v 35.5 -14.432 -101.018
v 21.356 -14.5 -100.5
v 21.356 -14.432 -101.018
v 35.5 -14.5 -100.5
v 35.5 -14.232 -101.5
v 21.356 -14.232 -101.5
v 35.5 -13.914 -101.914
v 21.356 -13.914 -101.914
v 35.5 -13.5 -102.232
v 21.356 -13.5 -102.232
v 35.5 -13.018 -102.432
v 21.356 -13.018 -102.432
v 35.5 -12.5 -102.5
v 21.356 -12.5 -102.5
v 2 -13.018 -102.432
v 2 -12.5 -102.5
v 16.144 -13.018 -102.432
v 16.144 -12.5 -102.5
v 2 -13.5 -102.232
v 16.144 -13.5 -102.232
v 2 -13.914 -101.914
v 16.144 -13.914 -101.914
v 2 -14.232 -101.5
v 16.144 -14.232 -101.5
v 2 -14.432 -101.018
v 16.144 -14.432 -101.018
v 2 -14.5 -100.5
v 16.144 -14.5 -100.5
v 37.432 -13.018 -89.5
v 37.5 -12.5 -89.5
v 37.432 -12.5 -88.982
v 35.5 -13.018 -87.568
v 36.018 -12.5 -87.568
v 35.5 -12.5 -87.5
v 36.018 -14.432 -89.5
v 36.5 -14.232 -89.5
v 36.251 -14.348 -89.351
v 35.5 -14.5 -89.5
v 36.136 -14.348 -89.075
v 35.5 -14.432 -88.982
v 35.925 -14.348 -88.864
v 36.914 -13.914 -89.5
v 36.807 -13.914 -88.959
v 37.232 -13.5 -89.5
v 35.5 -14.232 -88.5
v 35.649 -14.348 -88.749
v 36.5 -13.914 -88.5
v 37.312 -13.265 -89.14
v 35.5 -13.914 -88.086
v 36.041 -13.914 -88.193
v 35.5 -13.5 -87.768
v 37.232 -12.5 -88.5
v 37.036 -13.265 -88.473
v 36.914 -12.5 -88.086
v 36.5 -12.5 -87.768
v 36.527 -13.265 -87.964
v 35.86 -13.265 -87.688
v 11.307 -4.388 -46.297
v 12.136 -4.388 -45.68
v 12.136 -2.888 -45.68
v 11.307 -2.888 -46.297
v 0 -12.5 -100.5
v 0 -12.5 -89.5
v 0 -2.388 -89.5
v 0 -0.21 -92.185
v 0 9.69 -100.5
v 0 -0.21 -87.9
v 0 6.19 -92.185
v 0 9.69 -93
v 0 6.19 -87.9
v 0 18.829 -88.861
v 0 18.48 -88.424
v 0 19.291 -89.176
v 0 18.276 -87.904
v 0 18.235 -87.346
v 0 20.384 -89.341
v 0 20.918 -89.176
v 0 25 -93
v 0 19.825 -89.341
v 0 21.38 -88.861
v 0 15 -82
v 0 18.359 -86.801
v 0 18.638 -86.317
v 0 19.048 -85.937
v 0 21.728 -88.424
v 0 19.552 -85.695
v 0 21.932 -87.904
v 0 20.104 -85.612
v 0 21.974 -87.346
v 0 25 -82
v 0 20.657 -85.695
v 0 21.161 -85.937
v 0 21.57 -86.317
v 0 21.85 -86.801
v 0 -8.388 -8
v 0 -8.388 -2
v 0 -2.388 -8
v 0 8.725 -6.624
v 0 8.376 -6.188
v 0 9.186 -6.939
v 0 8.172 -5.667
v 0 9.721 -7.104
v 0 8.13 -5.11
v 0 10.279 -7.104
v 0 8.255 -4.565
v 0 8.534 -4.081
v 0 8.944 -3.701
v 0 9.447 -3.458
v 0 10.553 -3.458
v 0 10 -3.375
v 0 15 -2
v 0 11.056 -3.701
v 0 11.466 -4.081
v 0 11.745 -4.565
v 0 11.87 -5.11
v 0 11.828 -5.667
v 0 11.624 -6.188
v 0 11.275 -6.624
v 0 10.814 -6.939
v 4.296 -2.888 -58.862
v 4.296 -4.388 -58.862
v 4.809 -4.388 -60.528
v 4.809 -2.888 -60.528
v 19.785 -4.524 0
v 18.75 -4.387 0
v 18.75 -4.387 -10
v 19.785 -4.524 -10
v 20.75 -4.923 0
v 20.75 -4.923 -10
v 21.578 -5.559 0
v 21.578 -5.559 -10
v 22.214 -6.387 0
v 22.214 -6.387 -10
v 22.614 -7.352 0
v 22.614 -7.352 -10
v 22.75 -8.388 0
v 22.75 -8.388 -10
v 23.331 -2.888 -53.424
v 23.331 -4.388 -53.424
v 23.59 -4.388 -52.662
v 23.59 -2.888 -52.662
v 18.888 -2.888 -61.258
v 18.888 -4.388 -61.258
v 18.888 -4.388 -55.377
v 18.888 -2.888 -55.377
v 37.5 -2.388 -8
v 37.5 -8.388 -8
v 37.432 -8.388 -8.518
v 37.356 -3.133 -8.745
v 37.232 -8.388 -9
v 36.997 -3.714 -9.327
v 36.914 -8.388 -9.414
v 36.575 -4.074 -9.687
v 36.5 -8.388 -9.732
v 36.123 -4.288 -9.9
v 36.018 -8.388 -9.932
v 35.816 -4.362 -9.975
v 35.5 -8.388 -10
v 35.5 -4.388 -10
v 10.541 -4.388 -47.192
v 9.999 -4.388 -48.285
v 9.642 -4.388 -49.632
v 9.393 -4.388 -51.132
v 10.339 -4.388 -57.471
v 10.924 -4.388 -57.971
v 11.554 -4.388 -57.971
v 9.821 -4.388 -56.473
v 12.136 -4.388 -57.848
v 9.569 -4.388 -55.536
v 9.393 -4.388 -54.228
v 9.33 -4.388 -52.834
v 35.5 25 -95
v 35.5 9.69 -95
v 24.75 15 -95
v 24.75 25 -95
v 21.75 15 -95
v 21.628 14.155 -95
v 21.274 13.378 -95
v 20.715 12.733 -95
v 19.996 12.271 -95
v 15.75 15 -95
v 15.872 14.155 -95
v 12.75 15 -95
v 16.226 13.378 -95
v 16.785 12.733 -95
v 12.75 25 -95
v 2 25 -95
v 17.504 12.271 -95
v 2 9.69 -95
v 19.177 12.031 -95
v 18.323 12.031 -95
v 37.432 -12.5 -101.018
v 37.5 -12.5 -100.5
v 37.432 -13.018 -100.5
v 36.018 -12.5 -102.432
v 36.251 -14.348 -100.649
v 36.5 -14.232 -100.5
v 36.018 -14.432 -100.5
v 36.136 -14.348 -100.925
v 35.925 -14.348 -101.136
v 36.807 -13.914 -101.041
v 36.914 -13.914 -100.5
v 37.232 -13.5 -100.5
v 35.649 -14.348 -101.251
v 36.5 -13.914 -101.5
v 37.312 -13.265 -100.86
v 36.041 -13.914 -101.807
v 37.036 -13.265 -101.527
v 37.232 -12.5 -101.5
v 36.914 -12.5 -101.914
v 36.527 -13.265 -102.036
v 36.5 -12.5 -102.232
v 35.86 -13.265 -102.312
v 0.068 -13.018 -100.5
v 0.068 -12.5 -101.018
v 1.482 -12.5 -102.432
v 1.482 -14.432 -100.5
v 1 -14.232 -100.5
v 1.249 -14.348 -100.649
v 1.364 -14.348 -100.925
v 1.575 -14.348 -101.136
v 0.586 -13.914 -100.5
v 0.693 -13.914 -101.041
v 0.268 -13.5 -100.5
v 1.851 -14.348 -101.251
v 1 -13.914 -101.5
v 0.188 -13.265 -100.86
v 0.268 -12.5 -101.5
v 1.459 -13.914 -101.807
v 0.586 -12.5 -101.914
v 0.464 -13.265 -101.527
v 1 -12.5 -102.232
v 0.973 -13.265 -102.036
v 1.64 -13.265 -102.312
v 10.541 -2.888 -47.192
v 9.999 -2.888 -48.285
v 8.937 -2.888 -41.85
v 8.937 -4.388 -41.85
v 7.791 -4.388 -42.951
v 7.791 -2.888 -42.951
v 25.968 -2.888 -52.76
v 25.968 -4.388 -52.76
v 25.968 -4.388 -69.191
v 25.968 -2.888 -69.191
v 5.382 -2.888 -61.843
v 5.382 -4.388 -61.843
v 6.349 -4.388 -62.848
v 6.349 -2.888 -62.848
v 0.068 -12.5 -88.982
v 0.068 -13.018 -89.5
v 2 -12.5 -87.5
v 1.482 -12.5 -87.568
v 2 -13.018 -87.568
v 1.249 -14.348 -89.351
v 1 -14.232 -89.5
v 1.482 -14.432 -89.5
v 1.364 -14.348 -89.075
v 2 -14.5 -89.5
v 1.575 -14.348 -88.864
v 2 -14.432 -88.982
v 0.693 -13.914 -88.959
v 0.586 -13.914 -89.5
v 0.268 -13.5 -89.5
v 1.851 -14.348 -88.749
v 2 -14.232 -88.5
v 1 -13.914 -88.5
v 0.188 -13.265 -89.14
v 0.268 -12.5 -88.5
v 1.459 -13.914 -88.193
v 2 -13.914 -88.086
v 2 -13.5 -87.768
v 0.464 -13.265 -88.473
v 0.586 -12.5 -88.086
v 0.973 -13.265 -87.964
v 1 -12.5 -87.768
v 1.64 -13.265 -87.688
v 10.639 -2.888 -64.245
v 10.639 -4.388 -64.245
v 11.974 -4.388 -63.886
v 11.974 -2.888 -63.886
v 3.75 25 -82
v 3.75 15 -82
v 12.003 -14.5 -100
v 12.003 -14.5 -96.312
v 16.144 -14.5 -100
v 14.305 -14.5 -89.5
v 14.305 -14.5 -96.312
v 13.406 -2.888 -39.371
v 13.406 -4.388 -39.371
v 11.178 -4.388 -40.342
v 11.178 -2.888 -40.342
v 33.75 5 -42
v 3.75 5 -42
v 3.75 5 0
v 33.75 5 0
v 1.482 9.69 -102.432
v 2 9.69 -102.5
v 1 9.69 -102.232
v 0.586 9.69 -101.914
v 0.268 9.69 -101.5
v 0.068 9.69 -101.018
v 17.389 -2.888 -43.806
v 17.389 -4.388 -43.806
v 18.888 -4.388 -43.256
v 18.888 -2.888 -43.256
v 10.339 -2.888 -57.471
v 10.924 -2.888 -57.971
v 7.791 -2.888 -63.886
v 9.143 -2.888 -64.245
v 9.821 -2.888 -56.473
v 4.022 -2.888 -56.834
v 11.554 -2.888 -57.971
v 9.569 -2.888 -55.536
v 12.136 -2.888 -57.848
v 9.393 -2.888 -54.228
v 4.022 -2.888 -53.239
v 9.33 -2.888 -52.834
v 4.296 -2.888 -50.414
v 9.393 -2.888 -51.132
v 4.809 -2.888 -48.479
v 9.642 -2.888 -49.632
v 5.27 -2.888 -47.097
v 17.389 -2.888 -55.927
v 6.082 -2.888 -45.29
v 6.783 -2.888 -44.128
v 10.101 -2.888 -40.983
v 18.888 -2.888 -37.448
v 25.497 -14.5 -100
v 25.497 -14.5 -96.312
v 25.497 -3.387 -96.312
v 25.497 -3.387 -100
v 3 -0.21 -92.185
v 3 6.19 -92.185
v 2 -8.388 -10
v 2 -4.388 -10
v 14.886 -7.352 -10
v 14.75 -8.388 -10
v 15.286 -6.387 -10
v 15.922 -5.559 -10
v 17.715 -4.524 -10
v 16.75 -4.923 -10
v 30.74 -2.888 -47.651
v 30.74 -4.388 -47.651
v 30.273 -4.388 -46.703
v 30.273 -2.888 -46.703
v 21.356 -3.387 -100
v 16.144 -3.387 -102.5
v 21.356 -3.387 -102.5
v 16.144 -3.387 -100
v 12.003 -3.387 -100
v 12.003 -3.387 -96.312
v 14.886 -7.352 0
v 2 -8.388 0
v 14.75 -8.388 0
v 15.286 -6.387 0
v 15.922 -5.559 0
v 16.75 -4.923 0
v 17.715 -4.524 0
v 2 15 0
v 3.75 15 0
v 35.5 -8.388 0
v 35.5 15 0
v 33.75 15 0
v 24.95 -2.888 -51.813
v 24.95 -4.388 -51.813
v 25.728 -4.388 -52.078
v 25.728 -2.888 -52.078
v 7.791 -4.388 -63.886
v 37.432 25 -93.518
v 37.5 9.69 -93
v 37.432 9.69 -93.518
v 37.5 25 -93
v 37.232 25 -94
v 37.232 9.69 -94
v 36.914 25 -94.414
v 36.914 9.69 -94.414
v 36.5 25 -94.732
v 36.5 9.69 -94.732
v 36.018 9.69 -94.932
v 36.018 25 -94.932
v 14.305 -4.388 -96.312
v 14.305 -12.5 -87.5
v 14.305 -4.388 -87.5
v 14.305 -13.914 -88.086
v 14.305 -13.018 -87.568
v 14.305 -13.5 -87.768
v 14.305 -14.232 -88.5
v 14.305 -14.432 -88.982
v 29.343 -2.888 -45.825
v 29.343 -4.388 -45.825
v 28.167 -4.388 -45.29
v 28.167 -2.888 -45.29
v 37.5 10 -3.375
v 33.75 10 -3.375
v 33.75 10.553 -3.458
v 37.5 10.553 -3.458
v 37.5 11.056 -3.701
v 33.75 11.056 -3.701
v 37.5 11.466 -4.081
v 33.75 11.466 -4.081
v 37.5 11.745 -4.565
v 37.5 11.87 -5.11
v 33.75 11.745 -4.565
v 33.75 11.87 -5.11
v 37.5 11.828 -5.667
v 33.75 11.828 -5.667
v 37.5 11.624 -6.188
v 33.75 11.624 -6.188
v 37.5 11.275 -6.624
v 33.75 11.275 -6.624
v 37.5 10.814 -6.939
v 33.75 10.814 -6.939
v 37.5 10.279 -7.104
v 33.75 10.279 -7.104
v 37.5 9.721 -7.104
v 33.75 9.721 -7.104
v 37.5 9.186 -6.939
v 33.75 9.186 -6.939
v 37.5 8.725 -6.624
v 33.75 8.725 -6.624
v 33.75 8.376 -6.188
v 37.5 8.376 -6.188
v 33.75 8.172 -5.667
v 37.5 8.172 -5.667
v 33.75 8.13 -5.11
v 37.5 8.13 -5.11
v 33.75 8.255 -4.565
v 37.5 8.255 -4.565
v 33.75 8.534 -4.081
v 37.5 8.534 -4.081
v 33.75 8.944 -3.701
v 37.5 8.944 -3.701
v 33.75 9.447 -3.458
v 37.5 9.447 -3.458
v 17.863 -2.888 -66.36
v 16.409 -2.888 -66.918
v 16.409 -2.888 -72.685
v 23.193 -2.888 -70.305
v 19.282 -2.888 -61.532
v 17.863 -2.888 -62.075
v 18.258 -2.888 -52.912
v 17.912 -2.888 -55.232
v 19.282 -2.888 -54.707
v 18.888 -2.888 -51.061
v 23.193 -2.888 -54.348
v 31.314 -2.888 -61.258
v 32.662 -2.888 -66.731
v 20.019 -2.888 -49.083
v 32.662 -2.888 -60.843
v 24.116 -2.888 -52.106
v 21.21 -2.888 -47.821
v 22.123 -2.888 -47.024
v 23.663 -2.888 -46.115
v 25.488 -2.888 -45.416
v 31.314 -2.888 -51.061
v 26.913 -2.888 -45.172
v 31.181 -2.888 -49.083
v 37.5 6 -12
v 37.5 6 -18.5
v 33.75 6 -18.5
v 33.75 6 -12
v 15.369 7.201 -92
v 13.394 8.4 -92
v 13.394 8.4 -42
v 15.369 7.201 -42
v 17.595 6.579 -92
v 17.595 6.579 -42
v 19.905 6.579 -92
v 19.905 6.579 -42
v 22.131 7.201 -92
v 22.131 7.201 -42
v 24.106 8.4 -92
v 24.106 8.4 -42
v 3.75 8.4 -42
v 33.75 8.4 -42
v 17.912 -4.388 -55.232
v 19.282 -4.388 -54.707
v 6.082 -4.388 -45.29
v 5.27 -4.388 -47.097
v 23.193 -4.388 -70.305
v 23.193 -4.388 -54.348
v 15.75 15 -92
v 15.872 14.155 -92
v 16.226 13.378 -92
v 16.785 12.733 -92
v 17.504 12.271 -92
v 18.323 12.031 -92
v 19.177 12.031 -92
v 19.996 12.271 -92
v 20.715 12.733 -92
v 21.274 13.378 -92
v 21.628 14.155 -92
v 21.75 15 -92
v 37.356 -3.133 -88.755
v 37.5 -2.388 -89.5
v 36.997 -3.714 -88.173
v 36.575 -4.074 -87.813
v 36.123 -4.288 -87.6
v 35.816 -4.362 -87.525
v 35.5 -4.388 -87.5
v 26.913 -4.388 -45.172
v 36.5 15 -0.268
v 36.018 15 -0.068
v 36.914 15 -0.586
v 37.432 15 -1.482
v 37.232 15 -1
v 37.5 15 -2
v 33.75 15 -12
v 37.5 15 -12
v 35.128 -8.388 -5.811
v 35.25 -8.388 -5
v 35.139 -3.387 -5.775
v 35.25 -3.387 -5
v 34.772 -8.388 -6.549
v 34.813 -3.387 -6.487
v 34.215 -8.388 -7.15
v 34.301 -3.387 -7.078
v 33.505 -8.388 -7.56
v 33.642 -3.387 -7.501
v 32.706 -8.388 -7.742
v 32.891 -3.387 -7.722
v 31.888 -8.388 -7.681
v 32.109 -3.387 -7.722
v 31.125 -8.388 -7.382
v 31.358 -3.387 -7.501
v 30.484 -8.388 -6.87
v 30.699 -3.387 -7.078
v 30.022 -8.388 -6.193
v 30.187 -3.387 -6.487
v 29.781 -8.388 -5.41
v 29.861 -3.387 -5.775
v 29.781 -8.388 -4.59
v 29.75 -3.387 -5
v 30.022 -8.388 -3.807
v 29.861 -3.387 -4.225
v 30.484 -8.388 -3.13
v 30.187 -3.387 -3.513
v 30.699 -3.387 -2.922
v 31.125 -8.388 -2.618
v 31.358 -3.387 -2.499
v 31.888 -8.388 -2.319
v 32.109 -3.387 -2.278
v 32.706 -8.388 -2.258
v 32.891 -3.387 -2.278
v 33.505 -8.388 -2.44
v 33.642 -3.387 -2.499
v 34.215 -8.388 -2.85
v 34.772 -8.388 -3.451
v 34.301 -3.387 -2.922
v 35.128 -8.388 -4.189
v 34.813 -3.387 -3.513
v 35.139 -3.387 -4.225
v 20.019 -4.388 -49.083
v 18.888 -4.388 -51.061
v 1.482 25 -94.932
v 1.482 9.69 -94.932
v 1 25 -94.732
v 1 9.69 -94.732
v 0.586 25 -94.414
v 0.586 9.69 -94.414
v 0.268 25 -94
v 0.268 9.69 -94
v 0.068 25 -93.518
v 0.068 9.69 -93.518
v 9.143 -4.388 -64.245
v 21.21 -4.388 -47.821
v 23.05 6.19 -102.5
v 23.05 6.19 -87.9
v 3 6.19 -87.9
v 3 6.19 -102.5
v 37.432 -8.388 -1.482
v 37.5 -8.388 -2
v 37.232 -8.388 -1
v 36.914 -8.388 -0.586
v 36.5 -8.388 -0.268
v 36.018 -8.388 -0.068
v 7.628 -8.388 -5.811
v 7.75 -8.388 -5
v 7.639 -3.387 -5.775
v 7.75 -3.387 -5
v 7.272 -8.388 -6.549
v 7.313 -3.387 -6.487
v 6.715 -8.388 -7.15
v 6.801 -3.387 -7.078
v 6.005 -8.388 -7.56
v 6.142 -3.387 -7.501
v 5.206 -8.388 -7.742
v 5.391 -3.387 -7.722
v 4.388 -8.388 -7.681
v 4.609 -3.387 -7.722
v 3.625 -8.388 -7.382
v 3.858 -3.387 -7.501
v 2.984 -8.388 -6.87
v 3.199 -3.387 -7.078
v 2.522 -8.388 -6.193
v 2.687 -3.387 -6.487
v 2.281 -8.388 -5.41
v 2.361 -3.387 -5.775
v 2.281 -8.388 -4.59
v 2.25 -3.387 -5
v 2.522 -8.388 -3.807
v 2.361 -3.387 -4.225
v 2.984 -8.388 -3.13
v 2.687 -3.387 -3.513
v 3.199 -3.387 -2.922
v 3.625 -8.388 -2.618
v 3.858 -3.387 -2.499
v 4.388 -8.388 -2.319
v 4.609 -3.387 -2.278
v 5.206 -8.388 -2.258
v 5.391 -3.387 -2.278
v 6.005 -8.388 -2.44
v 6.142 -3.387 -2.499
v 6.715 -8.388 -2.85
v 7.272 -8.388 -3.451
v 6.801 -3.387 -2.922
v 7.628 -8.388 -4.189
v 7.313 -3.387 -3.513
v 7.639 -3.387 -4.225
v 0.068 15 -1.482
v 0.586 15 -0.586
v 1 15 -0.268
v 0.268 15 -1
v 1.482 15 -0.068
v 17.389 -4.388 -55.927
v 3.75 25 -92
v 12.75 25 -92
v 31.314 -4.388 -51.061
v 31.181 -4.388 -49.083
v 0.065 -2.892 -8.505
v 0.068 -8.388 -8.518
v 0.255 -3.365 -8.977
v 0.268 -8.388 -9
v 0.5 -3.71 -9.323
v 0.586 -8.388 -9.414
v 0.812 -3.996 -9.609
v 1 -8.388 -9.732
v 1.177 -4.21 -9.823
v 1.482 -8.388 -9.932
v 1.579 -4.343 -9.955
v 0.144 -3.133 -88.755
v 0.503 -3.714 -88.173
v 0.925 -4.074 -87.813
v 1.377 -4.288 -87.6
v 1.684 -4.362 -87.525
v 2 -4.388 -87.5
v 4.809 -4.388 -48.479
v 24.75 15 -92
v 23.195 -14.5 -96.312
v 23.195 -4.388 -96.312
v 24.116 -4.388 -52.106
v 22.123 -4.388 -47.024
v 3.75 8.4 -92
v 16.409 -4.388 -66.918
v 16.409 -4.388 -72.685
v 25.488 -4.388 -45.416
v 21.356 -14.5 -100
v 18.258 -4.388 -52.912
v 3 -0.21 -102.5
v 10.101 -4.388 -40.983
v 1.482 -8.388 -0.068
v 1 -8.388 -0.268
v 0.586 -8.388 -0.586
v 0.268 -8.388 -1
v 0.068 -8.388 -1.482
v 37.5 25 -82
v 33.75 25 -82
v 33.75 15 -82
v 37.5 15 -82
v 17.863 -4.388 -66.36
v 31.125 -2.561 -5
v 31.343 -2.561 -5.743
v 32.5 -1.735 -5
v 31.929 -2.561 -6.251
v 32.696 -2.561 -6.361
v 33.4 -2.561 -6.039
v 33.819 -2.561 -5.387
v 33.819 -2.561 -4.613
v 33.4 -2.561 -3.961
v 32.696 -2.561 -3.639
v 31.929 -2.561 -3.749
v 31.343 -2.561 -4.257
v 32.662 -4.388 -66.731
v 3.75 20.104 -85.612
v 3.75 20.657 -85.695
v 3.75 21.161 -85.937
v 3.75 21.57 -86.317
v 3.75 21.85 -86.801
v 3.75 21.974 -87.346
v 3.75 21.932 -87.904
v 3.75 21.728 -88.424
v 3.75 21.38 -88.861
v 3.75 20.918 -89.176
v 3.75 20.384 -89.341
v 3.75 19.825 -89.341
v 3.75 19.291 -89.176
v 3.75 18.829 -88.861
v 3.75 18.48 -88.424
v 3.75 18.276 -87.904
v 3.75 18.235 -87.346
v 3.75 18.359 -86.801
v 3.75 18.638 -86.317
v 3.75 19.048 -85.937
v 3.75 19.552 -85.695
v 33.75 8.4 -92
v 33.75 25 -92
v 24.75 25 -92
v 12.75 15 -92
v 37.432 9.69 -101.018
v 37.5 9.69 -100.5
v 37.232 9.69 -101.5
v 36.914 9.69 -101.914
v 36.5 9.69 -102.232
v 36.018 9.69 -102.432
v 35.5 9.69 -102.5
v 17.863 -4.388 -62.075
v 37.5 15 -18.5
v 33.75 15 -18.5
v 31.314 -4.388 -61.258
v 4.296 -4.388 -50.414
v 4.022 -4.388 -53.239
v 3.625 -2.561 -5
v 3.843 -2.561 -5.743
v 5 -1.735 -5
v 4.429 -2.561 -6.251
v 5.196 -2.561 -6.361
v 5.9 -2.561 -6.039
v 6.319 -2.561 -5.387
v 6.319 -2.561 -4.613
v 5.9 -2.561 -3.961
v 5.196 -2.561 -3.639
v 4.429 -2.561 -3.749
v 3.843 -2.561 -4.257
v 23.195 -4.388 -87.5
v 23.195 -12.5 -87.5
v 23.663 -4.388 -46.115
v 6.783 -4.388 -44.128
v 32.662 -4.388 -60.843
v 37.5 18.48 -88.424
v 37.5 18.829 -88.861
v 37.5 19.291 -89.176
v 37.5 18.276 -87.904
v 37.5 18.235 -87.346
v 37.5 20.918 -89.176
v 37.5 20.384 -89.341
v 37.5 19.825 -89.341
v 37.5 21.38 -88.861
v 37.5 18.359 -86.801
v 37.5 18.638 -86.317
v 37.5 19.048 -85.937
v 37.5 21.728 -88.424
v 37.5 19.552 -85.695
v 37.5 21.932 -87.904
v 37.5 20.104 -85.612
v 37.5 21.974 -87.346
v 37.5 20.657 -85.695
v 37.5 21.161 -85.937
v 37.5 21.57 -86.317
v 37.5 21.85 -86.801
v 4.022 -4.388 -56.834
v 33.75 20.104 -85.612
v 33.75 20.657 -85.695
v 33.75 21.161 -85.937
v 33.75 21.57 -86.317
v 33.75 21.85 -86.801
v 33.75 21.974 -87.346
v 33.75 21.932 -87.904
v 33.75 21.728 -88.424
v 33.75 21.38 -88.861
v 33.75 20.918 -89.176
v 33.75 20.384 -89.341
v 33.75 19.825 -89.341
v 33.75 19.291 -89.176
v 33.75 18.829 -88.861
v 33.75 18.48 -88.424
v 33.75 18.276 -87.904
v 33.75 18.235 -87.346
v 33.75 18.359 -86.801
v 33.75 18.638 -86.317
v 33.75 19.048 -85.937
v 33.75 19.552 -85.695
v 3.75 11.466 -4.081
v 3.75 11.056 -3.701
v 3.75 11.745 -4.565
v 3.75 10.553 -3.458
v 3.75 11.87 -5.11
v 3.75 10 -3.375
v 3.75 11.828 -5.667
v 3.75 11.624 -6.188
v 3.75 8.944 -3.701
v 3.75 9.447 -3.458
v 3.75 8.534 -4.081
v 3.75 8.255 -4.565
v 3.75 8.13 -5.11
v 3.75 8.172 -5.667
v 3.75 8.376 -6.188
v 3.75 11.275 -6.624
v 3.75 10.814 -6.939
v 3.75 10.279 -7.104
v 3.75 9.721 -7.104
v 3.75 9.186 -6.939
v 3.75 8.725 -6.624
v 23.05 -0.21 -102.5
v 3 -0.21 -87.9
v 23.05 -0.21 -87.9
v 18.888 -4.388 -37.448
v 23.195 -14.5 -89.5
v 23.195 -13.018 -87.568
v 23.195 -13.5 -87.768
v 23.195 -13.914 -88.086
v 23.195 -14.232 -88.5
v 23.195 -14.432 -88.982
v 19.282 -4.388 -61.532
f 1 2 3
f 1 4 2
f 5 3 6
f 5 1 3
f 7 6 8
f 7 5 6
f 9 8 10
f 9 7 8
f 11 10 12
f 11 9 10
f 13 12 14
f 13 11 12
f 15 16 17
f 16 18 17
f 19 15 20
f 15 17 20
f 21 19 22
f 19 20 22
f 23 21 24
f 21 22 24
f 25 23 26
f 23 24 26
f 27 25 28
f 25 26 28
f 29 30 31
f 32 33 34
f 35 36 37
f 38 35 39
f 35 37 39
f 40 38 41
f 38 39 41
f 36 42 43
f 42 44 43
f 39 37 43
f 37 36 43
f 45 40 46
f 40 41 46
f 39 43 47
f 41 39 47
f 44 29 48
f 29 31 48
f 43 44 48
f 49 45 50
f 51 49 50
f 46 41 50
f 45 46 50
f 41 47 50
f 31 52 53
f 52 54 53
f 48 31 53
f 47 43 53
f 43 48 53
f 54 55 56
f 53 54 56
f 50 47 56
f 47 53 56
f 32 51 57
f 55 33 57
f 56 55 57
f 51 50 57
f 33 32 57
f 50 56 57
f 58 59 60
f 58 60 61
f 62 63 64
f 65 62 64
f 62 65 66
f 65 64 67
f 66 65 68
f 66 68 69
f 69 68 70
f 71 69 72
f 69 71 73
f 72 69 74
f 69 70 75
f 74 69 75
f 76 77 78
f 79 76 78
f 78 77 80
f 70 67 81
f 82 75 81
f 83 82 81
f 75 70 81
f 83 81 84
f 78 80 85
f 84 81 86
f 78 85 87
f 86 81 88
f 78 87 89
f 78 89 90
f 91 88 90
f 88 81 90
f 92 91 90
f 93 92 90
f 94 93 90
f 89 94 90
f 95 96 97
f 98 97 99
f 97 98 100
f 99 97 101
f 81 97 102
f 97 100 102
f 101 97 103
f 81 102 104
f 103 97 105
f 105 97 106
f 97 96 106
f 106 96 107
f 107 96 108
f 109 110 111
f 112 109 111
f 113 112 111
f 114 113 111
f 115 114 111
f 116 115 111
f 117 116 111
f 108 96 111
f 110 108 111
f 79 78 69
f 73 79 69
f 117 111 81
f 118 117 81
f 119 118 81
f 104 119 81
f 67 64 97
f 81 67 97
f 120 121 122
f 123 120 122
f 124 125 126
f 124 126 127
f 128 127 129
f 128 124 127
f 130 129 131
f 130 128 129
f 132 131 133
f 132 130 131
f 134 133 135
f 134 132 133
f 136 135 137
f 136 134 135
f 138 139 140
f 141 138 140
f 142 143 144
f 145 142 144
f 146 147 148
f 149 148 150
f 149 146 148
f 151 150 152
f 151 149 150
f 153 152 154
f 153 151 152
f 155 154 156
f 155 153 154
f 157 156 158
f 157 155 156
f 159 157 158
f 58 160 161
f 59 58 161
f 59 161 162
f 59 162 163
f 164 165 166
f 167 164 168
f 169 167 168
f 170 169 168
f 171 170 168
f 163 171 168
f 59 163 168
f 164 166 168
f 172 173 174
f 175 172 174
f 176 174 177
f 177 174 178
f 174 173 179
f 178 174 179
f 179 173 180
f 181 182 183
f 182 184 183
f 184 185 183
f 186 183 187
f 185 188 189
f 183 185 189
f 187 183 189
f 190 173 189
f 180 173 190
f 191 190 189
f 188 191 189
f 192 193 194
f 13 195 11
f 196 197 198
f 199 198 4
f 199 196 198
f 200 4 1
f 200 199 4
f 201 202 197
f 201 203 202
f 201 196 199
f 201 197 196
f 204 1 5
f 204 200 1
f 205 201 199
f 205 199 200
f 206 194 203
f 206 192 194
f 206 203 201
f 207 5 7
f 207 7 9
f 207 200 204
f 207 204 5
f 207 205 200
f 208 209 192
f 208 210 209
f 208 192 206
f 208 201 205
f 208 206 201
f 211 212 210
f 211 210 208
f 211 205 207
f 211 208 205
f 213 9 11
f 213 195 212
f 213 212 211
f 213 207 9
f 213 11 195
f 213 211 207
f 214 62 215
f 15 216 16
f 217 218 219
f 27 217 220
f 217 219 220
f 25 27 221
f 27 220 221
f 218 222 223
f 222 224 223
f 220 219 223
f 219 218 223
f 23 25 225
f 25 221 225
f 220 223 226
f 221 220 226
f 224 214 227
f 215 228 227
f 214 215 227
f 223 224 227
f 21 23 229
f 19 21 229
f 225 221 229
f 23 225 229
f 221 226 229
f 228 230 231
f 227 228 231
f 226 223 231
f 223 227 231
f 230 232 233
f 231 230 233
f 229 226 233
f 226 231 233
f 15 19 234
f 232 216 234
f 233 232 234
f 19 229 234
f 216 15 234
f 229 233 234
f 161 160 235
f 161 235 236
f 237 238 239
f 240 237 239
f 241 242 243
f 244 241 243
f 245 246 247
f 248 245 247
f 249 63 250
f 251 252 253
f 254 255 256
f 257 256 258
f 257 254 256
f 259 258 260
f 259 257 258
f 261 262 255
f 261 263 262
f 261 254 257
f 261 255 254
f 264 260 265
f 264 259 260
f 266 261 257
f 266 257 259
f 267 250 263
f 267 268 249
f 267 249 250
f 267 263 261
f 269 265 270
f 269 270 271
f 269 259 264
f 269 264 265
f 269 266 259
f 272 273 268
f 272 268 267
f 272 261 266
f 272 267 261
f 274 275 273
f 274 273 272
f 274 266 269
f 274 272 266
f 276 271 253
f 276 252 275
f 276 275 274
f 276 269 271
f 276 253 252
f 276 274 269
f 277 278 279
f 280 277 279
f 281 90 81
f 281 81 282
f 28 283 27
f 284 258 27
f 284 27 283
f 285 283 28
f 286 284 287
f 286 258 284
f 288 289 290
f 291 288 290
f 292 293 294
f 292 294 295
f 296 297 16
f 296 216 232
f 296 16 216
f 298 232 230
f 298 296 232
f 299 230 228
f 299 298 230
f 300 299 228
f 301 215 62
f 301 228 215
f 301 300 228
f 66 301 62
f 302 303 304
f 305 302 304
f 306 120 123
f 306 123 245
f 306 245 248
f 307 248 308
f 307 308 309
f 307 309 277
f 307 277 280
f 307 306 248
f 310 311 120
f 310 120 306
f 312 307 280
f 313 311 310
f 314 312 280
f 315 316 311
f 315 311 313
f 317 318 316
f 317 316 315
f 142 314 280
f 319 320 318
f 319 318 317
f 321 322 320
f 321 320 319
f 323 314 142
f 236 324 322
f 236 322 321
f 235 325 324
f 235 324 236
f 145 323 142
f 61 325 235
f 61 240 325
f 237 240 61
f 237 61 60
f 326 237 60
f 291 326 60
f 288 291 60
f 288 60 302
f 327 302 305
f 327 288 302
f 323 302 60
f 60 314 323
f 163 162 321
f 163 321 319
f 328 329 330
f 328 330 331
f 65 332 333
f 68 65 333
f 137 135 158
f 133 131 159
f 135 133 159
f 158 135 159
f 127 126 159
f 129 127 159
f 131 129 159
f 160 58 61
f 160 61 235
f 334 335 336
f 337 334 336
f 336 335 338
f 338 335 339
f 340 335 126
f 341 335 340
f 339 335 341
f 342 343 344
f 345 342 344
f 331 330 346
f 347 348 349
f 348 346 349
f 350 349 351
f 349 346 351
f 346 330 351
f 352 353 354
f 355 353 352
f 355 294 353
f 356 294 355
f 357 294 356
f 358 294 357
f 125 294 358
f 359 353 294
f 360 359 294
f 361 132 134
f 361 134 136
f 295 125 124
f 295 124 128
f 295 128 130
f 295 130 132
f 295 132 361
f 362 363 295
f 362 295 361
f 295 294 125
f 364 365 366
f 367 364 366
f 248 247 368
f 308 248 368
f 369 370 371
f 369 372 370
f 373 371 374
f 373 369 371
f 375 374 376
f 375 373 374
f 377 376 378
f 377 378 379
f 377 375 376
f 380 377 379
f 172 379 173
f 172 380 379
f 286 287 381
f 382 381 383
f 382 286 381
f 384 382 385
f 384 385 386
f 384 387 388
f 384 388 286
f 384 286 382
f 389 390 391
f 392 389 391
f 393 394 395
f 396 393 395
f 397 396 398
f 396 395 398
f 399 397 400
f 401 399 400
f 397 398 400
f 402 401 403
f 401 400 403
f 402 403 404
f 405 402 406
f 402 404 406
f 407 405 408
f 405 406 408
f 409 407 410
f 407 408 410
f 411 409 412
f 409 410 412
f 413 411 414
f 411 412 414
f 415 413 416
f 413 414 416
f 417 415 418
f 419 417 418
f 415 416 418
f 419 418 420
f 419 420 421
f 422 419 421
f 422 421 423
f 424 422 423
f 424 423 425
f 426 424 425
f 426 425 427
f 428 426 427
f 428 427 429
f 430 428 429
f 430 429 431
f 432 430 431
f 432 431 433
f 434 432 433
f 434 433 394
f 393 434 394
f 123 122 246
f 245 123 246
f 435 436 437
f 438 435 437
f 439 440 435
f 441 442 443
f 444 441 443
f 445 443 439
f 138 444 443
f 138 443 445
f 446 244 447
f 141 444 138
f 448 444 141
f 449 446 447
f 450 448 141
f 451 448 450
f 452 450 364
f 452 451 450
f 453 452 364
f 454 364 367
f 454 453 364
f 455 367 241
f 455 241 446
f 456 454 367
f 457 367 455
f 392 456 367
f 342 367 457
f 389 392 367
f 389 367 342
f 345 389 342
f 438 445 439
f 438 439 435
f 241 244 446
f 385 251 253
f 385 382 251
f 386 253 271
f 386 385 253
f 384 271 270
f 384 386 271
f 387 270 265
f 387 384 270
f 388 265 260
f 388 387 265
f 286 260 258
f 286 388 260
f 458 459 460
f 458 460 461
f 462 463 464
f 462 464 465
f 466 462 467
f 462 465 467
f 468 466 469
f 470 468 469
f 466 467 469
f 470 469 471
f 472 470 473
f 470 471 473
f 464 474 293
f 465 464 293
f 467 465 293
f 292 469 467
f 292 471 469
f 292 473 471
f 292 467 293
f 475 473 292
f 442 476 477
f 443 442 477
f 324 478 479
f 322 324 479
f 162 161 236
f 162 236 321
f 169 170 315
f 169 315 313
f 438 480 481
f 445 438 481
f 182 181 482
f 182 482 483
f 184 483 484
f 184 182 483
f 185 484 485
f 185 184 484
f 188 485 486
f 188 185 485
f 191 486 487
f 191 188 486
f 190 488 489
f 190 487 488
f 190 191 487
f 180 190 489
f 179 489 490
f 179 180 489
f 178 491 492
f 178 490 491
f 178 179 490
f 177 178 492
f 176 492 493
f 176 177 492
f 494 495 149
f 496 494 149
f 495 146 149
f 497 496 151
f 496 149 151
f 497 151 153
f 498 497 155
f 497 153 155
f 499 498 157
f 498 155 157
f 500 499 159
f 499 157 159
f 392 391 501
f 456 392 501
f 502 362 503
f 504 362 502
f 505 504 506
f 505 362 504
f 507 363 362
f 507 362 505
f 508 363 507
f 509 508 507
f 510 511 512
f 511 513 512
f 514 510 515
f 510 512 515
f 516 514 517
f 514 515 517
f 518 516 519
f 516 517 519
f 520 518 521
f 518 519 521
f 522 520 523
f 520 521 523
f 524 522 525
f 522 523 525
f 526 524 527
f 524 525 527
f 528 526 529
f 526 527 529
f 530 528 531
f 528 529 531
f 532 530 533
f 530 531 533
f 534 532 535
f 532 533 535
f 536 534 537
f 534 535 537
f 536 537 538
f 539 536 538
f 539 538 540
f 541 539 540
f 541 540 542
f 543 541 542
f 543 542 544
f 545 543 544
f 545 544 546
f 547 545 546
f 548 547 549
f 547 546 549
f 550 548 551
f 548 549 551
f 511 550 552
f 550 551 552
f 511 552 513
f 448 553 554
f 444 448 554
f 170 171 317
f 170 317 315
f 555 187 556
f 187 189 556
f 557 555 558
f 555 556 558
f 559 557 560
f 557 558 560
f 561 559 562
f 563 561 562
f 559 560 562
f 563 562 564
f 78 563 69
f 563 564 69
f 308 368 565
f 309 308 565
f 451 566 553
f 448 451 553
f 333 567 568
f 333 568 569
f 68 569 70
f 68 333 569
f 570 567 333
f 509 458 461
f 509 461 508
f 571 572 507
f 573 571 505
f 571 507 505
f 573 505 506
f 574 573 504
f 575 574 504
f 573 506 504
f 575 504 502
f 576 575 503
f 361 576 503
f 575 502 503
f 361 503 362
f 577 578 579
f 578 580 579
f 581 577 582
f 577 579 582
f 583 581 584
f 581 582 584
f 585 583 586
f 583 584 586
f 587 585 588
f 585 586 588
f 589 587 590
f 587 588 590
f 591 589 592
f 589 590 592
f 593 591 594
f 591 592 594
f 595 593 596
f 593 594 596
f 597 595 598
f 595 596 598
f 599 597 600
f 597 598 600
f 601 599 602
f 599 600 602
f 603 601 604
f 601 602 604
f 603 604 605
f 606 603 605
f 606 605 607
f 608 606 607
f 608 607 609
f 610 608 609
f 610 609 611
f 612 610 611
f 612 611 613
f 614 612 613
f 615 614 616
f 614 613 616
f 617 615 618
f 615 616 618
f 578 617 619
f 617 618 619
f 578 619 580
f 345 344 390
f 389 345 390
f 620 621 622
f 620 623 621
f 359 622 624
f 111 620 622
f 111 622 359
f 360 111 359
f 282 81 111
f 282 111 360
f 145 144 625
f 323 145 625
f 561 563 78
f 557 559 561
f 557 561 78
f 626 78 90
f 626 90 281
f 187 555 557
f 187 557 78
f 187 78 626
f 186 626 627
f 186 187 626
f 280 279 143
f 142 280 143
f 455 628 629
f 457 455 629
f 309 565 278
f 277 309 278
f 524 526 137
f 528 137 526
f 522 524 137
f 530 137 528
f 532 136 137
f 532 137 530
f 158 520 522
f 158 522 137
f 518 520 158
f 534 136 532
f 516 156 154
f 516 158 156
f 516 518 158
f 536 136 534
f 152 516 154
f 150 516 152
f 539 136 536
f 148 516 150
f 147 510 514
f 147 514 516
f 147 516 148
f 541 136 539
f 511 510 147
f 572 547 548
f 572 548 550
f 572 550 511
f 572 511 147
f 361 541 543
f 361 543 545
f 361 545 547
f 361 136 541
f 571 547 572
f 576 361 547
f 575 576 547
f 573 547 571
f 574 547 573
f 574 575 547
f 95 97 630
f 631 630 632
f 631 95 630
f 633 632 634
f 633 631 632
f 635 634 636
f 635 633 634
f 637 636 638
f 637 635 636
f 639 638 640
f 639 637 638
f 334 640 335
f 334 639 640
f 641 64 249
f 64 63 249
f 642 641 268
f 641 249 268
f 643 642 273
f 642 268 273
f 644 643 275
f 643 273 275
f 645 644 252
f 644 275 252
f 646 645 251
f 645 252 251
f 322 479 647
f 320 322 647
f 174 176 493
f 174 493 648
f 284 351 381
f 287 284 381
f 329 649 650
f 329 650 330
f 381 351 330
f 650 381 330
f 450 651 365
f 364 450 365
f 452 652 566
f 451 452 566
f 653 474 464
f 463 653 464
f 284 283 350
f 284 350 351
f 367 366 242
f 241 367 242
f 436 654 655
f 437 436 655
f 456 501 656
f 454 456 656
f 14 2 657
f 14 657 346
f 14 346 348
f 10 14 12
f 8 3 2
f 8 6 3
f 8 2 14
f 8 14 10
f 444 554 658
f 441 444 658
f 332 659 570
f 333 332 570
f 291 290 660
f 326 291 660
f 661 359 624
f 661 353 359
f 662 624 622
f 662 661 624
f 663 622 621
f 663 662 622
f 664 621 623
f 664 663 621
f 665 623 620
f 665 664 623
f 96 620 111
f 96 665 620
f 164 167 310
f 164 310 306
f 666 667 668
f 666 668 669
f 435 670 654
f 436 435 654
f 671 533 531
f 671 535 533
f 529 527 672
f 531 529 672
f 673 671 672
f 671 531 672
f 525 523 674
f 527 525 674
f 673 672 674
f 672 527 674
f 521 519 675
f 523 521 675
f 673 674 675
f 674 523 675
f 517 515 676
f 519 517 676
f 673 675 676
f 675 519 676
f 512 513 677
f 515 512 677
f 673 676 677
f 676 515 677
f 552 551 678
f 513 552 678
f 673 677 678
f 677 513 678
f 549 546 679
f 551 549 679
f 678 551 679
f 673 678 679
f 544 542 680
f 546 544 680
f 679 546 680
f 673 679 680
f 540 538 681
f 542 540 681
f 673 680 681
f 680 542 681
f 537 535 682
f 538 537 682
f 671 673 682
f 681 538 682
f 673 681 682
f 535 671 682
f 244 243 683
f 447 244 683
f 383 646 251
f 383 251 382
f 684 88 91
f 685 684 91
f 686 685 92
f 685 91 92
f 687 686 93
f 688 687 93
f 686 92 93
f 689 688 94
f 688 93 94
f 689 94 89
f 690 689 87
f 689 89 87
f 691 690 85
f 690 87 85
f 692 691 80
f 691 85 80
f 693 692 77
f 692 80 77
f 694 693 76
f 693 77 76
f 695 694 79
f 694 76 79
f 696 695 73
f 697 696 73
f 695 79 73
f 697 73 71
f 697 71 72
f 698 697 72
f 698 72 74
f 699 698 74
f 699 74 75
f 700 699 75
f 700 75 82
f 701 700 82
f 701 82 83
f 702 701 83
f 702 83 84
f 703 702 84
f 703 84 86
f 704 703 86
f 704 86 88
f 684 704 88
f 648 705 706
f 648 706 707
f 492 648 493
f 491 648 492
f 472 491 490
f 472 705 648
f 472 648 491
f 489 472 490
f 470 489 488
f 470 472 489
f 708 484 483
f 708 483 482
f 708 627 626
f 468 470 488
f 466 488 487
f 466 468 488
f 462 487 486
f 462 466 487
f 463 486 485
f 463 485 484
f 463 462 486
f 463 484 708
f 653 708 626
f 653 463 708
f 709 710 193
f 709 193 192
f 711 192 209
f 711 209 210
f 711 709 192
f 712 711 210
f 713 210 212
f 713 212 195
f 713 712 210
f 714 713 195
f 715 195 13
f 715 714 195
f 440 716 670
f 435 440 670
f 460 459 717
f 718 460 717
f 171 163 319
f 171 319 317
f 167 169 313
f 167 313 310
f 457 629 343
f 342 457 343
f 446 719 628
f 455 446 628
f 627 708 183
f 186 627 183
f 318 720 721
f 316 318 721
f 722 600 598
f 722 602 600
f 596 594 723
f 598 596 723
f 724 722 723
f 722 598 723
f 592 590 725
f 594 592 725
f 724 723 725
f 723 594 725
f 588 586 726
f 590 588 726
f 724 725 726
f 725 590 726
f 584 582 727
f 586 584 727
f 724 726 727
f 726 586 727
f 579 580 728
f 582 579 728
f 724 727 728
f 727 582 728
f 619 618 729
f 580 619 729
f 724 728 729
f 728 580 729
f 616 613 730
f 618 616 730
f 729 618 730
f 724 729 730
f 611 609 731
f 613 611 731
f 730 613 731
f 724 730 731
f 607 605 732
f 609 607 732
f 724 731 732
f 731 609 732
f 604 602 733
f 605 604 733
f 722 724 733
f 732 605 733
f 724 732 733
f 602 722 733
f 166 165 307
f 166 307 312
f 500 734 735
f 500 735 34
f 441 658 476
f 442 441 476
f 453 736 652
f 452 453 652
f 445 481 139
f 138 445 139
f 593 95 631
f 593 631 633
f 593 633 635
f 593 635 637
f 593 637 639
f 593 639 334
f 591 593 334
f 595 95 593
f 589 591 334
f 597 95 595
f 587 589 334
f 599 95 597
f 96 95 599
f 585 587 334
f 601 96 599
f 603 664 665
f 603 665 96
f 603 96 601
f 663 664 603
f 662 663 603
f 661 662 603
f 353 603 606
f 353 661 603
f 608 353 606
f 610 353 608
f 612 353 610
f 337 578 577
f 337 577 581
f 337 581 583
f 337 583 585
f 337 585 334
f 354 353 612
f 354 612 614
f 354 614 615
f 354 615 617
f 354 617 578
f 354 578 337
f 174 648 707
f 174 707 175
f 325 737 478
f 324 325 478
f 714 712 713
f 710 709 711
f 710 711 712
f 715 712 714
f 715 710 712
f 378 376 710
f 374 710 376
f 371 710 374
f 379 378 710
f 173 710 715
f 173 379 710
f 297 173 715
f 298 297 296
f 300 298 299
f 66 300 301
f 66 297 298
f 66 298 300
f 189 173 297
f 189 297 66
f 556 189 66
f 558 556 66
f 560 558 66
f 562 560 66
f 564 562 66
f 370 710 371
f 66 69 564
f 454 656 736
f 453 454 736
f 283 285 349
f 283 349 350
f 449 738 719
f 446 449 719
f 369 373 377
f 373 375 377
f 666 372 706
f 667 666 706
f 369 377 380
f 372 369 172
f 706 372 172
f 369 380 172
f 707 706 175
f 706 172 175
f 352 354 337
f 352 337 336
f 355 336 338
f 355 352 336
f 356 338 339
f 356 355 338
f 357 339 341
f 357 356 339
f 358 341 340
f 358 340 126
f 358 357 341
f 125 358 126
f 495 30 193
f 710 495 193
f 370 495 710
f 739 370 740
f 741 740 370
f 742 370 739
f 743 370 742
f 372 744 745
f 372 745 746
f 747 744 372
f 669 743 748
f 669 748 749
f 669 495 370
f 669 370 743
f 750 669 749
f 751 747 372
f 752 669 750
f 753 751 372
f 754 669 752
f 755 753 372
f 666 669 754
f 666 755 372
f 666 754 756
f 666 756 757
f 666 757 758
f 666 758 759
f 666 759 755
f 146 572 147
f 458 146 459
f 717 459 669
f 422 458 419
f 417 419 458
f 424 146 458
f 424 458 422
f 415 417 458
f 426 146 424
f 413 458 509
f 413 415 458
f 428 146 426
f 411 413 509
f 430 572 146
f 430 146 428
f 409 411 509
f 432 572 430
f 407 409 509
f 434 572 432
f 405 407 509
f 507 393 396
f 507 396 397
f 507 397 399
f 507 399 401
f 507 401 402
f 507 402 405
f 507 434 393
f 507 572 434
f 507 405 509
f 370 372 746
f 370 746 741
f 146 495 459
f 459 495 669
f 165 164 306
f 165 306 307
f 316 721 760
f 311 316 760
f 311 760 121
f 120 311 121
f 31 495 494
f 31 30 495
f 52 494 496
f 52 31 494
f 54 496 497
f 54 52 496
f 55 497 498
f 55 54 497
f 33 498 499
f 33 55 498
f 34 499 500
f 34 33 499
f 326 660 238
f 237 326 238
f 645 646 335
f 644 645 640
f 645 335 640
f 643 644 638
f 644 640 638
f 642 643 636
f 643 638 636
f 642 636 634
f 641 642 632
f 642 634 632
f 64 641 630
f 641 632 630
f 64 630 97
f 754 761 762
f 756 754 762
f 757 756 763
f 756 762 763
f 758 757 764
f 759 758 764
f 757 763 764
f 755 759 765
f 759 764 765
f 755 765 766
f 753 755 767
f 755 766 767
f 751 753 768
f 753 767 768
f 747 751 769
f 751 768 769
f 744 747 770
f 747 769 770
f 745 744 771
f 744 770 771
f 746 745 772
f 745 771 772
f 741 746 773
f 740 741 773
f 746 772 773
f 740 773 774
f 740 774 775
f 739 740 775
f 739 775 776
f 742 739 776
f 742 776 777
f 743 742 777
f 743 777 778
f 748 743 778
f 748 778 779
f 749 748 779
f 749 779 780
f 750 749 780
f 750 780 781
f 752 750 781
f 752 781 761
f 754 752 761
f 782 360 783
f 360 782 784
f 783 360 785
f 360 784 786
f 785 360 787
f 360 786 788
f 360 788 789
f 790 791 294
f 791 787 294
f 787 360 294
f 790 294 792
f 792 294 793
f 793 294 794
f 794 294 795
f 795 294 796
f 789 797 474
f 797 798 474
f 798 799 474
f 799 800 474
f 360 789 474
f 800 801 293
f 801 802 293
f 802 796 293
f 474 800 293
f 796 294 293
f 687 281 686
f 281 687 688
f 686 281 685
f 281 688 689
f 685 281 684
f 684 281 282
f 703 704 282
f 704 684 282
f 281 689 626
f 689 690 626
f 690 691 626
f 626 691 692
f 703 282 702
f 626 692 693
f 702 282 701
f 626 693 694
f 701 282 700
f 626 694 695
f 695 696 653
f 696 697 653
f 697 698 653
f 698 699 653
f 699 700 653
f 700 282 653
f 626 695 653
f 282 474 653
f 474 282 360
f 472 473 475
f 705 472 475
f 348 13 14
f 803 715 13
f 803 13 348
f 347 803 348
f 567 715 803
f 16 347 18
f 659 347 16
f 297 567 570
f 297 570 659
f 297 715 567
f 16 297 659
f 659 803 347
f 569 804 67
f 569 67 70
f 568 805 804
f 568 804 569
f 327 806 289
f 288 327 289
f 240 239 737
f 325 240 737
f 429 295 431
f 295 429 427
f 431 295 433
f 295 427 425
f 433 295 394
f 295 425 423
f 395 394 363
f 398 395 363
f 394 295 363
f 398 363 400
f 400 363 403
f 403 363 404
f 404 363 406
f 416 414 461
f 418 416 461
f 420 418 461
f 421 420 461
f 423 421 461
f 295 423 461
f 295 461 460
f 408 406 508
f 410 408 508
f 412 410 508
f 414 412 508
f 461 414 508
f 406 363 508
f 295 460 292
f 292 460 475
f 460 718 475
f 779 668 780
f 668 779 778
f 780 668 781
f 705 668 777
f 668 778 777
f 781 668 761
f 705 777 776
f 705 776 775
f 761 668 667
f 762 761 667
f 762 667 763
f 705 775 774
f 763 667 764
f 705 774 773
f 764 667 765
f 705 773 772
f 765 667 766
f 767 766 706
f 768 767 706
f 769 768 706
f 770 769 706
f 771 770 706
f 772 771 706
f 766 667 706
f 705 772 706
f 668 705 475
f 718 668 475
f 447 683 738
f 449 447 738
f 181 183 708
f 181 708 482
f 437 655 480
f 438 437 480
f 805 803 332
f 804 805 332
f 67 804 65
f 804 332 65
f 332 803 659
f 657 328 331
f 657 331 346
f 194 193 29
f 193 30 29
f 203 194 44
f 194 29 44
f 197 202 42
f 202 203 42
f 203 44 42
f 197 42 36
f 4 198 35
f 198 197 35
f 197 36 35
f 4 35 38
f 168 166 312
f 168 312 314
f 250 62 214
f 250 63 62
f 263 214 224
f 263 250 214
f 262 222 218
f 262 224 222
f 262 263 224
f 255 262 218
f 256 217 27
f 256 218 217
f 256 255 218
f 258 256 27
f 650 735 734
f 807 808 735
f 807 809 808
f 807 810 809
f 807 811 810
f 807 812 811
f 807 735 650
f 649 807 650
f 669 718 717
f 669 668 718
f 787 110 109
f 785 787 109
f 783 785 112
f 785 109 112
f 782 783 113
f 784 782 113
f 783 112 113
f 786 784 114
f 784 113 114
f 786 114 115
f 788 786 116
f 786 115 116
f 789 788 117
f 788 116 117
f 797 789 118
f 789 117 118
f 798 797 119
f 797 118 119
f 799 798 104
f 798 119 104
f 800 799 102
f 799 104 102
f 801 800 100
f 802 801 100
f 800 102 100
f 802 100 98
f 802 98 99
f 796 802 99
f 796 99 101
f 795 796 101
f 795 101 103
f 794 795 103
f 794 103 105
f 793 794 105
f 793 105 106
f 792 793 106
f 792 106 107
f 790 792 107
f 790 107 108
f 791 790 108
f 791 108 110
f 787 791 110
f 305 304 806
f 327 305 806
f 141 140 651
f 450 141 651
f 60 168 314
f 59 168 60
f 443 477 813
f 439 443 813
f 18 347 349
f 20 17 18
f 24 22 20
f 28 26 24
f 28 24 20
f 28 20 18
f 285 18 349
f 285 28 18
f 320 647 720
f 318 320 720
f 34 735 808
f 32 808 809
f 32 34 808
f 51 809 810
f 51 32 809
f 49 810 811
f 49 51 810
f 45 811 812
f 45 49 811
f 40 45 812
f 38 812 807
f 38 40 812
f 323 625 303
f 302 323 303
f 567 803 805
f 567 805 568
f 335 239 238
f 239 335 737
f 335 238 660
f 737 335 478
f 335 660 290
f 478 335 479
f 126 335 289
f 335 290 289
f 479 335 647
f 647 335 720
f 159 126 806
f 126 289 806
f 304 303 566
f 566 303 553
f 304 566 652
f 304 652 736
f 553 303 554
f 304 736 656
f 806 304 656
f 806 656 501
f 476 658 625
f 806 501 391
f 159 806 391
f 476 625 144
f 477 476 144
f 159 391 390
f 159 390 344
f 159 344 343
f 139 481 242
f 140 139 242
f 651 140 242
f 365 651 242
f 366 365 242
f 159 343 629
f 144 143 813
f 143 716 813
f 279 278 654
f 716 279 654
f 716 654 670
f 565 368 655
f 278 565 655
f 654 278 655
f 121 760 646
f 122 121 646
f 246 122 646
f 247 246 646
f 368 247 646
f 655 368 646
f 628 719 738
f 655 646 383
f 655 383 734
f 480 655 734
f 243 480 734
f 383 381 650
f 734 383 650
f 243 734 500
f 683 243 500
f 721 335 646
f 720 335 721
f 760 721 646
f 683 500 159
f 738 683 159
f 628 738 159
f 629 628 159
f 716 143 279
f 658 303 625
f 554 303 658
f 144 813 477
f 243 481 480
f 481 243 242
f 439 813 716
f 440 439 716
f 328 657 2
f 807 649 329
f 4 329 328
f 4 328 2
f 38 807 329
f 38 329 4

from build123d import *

# Parameters (mm, degrees)
SKETCH2_W                 = 37.5
SKETCH2_H                 = 95
BOSS_EXTRUDE1_DEPTH       = 15
SKETCH3_W                 = 30
SKETCH3_H                 = 42
CUT_EXTRUDE1_DEPTH        = 10
SKETCH5_R                 = 8.5
SKETCH5_W                 = 30
SKETCH5_H                 = 6.6
CUT_EXTRUDE2_DEPTH        = 50
CUT_EXTRUDE3_DEPTH        = 10
SKETCH7_W                 = 6.5
SKETCH7_H                 = 9
CUT_EXTRUDE4_DEPTH        = 3.75
SKETCH8_W                 = 12.75
SKETCH8_H                 = 3
BOSS_EXTRUDE2_DEPTH       = 10
F_2_5MM_DOWEL_HOLE2_D     = 3.75
SKETCH14_W                = 37.5
SKETCH14_H                = 15
BOSS_EXTRUDE3_DEPTH       = 14.5
CUT_EXTRUDE5_DEPTH        = 11.1125
SKETCH16_W                = 8.89
SKETCH16_H                = 8.8125
BOSS_EXTRUDE4_DEPTH       = 1
SKETCH17_W                = 3.75
SKETCH17_H                = 10
BOSS_EXTRUDE5_DEPTH       = 10
F_2_5MM_DOWEL_HOLE3_D     = 3.75
SKETCH24_W                = 37.5
SKETCH24_H                = 4.3875
BOSS_EXTRUDE7_DEPTH       = 87.5
BOSS_EXTRUDE8_DEPTH       = 10
SKETCH26_W                = 37.5
SKETCH26_H                = 9.690281336
BOSS_EXTRUDE9_DEPTH       = 7.5
SKETCH27_W                = 20.05
SKETCH27_H                = 6.4
CUT_EXTRUDE6_DEPTH        = 14.6
FILLET2_R                 = 2
F_2_5MM_DOWEL_HOLE4_D     = 5.5
F_2_5MM_DOWEL_HOLE4_DEPTH = 5
F_2_5MM_DOWEL_HOLE4_TIP   = 1.652366702
SKETCH31_W                = 4.284862737
SKETCH31_H                = 6.4
CUT_EXTRUDE7_DEPTH        = 112.002252229
CUT_EXTRUDE8_DEPTH        = 1.5


with BuildPart() as part:
    # Sketch2 → Boss-Extrude1 (new body)
    with BuildSketch(Plane(origin=(0, 0, 0), x_dir=(1, 0, 0), z_dir=(0, 1, 0))):
        with Locations((18.75, 47.5)):
            Rectangle(SKETCH2_W, SKETCH2_H)
    extrude(amount=BOSS_EXTRUDE1_DEPTH)

    # Sketch3 → Cut-Extrude1 (cut)
    with BuildSketch(Plane(origin=(0, 15, 0), x_dir=(1, 0, 0), z_dir=(0, 1, 0))):
        with Locations((18.75, 21)):
            Rectangle(SKETCH3_W, SKETCH3_H)
    extrude(amount=-CUT_EXTRUDE1_DEPTH, mode=Mode.SUBTRACT)

    # Sketch5 → Cut-Extrude2 (cut)
    with BuildSketch(Plane.XY.offset(-42)):
        with Locations((18.75, 15)):
            Circle(SKETCH5_R)
        with Locations((18.75, 11.7)):
            Rectangle(SKETCH5_W, SKETCH5_H)
    extrude(amount=-CUT_EXTRUDE2_DEPTH, mode=Mode.SUBTRACT)

    # Sketch6 → Cut-Extrude3 (cut)
    with BuildSketch(Plane(origin=(0, 0, -95), x_dir=(-1, 0, 0), z_dir=(0, 0, -1))):
        with BuildLine():
            Line((-21.75, 15), (-15.75, 15))
            ThreePointArc((-15.75, 15), (-18.75, 12), (-21.75, 15))
        make_face()
    extrude(amount=-CUT_EXTRUDE3_DEPTH, mode=Mode.SUBTRACT)

    # Sketch7 → Cut-Extrude4 (cut)
    with BuildSketch(Plane.ZY.offset(-37.5)):
        with Locations((-15.25, 10.5)):
            Rectangle(SKETCH7_W, SKETCH7_H)
    extrude(amount=CUT_EXTRUDE4_DEPTH, mode=Mode.SUBTRACT)

    # Sketch8 → Boss-Extrude2 (add)
    with BuildSketch(Plane(origin=(0, 15, 0), x_dir=(1, 0, 0), z_dir=(0, 1, 0))):
        with Locations((6.375, 93.5)):
            Rectangle(SKETCH8_W, SKETCH8_H)
    boss_extrude2 = extrude(amount=BOSS_EXTRUDE2_DEPTH)

    # Mirror1: Boss-Extrude2 across plane
    add(boss_extrude2.mirror(Plane.ZY.offset(-18.75)))

    # Ø2.5mm Dowel Hole2 (through all)
    with Locations(Plane(origin=(37.5, 0, 0), x_dir=(0, 0, -1), z_dir=(1, 0, 0))):
        with Locations((5.25, 10)):
            Hole(F_2_5MM_DOWEL_HOLE2_D / 2)

    # Sketch14 → Boss-Extrude3 (add)
    with BuildSketch(Plane.XZ):
        with Locations((18.75, -95)):
            Rectangle(SKETCH14_W, SKETCH14_H)
    extrude(amount=BOSS_EXTRUDE3_DEPTH)

    # Sketch15 → Cut-Extrude5 (cut)
    with BuildSketch(Plane.XZ.offset(14.5)):
        Polygon((16.143541, -102.5), (16.143541, -100), (12.003125, -100), (12.003125, -96.3125), (14.305, -96.3125), (14.305, -87.5), (23.195, -87.5), (23.195, -96.3125), (25.496875, -96.3125), (25.496875, -100), (21.356459, -100), (21.356459, -102.5), align=None)
    extrude(amount=-CUT_EXTRUDE5_DEPTH, mode=Mode.SUBTRACT)

    # Sketch16 → Boss-Extrude4 (add)
    with BuildSketch(Plane.XZ.offset(3.3875)):
        with Locations((18.75, -91.90625)):
            Rectangle(SKETCH16_W, SKETCH16_H)
    extrude(amount=BOSS_EXTRUDE4_DEPTH)

    # Sketch17 → Boss-Extrude5 (add)
    with BuildSketch(Plane(origin=(0, 15, 0), x_dir=(1, 0, 0), z_dir=(0, 1, 0))):
        with Locations((1.875, 87)):
            Rectangle(SKETCH17_W, SKETCH17_H)
        with Locations((35.625, 87)):
            Rectangle(SKETCH17_W, SKETCH17_H)
    extrude(amount=BOSS_EXTRUDE5_DEPTH)

    # Ø2.5mm Dowel Hole3 (through all)
    with Locations(Plane(origin=(37.5, 0, 0), x_dir=(0, 0, -1), z_dir=(1, 0, 0))):
        with Locations((87.486504599, 20.104293775)):
            Hole(F_2_5MM_DOWEL_HOLE3_D / 2)

    # Sketch24 → Boss-Extrude7 (add)
    with BuildSketch(Plane.XY.offset(-87.5)):
        with Locations((18.75, -2.19375)):
            Rectangle(SKETCH24_W, SKETCH24_H)
    extrude(amount=BOSS_EXTRUDE7_DEPTH)

    # Sketch25 → Boss-Extrude8 (add)
    with BuildSketch(Plane.XY):
        with BuildLine():
            Line((37.5, -4.3875), (18.75, -4.3875))
            ThreePointArc((18.75, -4.3875), (21.578427125, -5.559072875), (22.75, -8.3875))
            Line((22.75, -8.3875), (37.5, -8.3875))
            Line((37.5, -8.3875), (37.5, -4.3875))
        make_face()
        with BuildLine():
            Line((18.75, -4.3875), (0, -4.3875))
            Line((0, -4.3875), (0, -8.3875))
            Line((0, -8.3875), (14.75, -8.3875))
            ThreePointArc((14.75, -8.3875), (15.921572875, -5.559072875), (18.75, -4.3875))
        make_face()
    extrude(amount=-BOSS_EXTRUDE8_DEPTH)

    # Sketch26 → Boss-Extrude9 (add)
    with BuildSketch(Plane(origin=(0, 0, -95), x_dir=(-1, 0, 0), z_dir=(0, 0, -1))):
        with Locations((-18.75, 4.845140668)):
            Rectangle(SKETCH26_W, SKETCH26_H)
    extrude(amount=BOSS_EXTRUDE9_DEPTH)

    # Sketch27 → Cut-Extrude6 (cut)
    with BuildSketch(Plane(origin=(0, 0, -102.5), x_dir=(-1, 0, 0), z_dir=(0, 0, -1))):
        with Locations((-13.025, 2.990281336)):
            Rectangle(SKETCH27_W, SKETCH27_H)
    extrude(amount=-CUT_EXTRUDE6_DEPTH, mode=Mode.SUBTRACT)

    # Fillet2
    fillet2_edges = [part.edges().sort_by_distance(p)[0] for p in [
        (0, -9.44375, -87.5),
        (0, -2.404859332, -102.5),
        (37.5, -2.404859332, -102.5),
        (37.5, -9.44375, -87.5),
        (0, -14.5, -95),
        (8.0717705, -14.5, -102.5),
        (37.5, -14.5, -95),
        (30.3475, -14.5, -87.5),
        (29.4282295, -14.5, -102.5),
        (7.1525, -14.5, -87.5),
        (37.5, -4.3875, -48.75),
        (37.5, -6.3875, -10),
        (0, -4.3875, -48.75),
        (0, -6.3875, -10),
        (0, 17.345140668, -95),
        (37.5, 17.345140668, -95),
        (37.5, 3.30625, 0),
        (0, 3.30625, 0),
    ]]
    fillet(fillet2_edges, radius=FILLET2_R)

    # Ø2.5mm Dowel Hole4
    with Locations(Plane(origin=(0, -8.3875, 0), x_dir=(-1, 0, 0), z_dir=(0, -1, 0))):
        with Locations((-32.5, 5), (-5, 5)):
            Hole(F_2_5MM_DOWEL_HOLE4_D / 2, depth=F_2_5MM_DOWEL_HOLE4_DEPTH)
            with Locations((0, 0, -(F_2_5MM_DOWEL_HOLE4_DEPTH + F_2_5MM_DOWEL_HOLE4_TIP / 2))):  # 118° drill point
                Cone(0, F_2_5MM_DOWEL_HOLE4_D / 2, F_2_5MM_DOWEL_HOLE4_TIP, mode=Mode.SUBTRACT)

    # Sketch31 → Cut-Extrude7 (cut, through all)
    with BuildSketch(Plane(origin=(3, 0, 0), x_dir=(0, 0, -1), z_dir=(1, 0, 0))):
        with Locations((90.042431369, 2.990281336)):
            Rectangle(SKETCH31_W, SKETCH31_H)
    extrude(amount=-CUT_EXTRUDE7_DEPTH, mode=Mode.SUBTRACT)

    # Sketch32 → Cut-Extrude8 (cut)
    with BuildSketch(Plane.XZ.offset(4.3875)):
        Polygon((32.662211036, -66.731402862), (32.662211036, -60.842760163), (31.314060446, -61.257991767), (31.314060446, -51.061409973), (31.181038698, -49.082813371), (30.740043615, -47.651015368), (30.272932489, -46.702611031), (29.343491661, -45.825186496), (28.166570354, -45.289551545), (26.913013893, -45.172232341), (25.487931235, -45.415918592), (23.663222713, -46.115147592), (22.123128119, -47.024353691), (21.210078183, -47.821011367), (20.018893116, -49.082813371), (18.887507594, -51.061409973), (18.257769049, -52.911736478), (17.912229988, -55.231688956), (19.282356905, -54.7066558), (19.282356905, -61.531664738), (17.863237505, -62.075471832), (17.863237505, -66.360306951), (16.408711909, -66.917681713), (16.408711909, -72.685258984), (23.193470428, -70.305264788), (23.193470428, -54.347624256), (23.331002369, -53.424233522), (23.59042172, -52.661995758), (24.115625328, -52.105656542), (24.950101738, -51.812934405), (25.728287005, -52.077781315), (25.967613662, -52.760040784), (25.967613662, -69.19073609), align=None)
        Polygon((18.887507594, -61.257991767), (18.887507594, -55.376949047), (17.389382, -55.927301794), (17.389382, -43.806150983), (18.887507594, -43.255798236), (18.887507594, -37.448382085), (13.405832614, -39.371273607), (11.177740444, -40.341723555), (10.100640592, -40.98328383), (8.936720005, -41.849530032), (7.790955921, -42.951413953), (6.783486907, -44.128073894), (6.081538262, -45.289551545), (5.270405037, -47.097284534), (4.808853701, -48.478793464), (4.295716054, -50.413974213), (4.021830569, -53.238519595), (4.021830569, -56.833755888), (4.295716054, -58.862358442), (4.808853701, -60.527748098), (5.381572286, -61.842674021), (6.348688627, -62.848303696), (7.790955921, -63.886150712), (9.142953346, -64.244649926), (10.639190518, -64.244649926), (11.974170787, -63.886150712), align=None)
        Polygon((12.135932336, -57.848057165), (12.135932336, -45.679668485), (11.306680653, -46.296837843), (10.540601176, -47.191570107), (9.999416807, -48.284787608), (9.642235274, -49.631815705), (9.392627445, -51.131802286), (9.330267236, -52.833612335), (9.392627445, -54.227691449), (9.569214099, -55.535625441), (9.82082604, -56.47257862), (10.338657712, -57.470582903), (10.923640914, -57.97145187), (11.554307118, -57.97145187), align=None, mode=Mode.SUBTRACT)
    extrude(amount=-CUT_EXTRUDE8_DEPTH, mode=Mode.SUBTRACT)


solid = part.part
